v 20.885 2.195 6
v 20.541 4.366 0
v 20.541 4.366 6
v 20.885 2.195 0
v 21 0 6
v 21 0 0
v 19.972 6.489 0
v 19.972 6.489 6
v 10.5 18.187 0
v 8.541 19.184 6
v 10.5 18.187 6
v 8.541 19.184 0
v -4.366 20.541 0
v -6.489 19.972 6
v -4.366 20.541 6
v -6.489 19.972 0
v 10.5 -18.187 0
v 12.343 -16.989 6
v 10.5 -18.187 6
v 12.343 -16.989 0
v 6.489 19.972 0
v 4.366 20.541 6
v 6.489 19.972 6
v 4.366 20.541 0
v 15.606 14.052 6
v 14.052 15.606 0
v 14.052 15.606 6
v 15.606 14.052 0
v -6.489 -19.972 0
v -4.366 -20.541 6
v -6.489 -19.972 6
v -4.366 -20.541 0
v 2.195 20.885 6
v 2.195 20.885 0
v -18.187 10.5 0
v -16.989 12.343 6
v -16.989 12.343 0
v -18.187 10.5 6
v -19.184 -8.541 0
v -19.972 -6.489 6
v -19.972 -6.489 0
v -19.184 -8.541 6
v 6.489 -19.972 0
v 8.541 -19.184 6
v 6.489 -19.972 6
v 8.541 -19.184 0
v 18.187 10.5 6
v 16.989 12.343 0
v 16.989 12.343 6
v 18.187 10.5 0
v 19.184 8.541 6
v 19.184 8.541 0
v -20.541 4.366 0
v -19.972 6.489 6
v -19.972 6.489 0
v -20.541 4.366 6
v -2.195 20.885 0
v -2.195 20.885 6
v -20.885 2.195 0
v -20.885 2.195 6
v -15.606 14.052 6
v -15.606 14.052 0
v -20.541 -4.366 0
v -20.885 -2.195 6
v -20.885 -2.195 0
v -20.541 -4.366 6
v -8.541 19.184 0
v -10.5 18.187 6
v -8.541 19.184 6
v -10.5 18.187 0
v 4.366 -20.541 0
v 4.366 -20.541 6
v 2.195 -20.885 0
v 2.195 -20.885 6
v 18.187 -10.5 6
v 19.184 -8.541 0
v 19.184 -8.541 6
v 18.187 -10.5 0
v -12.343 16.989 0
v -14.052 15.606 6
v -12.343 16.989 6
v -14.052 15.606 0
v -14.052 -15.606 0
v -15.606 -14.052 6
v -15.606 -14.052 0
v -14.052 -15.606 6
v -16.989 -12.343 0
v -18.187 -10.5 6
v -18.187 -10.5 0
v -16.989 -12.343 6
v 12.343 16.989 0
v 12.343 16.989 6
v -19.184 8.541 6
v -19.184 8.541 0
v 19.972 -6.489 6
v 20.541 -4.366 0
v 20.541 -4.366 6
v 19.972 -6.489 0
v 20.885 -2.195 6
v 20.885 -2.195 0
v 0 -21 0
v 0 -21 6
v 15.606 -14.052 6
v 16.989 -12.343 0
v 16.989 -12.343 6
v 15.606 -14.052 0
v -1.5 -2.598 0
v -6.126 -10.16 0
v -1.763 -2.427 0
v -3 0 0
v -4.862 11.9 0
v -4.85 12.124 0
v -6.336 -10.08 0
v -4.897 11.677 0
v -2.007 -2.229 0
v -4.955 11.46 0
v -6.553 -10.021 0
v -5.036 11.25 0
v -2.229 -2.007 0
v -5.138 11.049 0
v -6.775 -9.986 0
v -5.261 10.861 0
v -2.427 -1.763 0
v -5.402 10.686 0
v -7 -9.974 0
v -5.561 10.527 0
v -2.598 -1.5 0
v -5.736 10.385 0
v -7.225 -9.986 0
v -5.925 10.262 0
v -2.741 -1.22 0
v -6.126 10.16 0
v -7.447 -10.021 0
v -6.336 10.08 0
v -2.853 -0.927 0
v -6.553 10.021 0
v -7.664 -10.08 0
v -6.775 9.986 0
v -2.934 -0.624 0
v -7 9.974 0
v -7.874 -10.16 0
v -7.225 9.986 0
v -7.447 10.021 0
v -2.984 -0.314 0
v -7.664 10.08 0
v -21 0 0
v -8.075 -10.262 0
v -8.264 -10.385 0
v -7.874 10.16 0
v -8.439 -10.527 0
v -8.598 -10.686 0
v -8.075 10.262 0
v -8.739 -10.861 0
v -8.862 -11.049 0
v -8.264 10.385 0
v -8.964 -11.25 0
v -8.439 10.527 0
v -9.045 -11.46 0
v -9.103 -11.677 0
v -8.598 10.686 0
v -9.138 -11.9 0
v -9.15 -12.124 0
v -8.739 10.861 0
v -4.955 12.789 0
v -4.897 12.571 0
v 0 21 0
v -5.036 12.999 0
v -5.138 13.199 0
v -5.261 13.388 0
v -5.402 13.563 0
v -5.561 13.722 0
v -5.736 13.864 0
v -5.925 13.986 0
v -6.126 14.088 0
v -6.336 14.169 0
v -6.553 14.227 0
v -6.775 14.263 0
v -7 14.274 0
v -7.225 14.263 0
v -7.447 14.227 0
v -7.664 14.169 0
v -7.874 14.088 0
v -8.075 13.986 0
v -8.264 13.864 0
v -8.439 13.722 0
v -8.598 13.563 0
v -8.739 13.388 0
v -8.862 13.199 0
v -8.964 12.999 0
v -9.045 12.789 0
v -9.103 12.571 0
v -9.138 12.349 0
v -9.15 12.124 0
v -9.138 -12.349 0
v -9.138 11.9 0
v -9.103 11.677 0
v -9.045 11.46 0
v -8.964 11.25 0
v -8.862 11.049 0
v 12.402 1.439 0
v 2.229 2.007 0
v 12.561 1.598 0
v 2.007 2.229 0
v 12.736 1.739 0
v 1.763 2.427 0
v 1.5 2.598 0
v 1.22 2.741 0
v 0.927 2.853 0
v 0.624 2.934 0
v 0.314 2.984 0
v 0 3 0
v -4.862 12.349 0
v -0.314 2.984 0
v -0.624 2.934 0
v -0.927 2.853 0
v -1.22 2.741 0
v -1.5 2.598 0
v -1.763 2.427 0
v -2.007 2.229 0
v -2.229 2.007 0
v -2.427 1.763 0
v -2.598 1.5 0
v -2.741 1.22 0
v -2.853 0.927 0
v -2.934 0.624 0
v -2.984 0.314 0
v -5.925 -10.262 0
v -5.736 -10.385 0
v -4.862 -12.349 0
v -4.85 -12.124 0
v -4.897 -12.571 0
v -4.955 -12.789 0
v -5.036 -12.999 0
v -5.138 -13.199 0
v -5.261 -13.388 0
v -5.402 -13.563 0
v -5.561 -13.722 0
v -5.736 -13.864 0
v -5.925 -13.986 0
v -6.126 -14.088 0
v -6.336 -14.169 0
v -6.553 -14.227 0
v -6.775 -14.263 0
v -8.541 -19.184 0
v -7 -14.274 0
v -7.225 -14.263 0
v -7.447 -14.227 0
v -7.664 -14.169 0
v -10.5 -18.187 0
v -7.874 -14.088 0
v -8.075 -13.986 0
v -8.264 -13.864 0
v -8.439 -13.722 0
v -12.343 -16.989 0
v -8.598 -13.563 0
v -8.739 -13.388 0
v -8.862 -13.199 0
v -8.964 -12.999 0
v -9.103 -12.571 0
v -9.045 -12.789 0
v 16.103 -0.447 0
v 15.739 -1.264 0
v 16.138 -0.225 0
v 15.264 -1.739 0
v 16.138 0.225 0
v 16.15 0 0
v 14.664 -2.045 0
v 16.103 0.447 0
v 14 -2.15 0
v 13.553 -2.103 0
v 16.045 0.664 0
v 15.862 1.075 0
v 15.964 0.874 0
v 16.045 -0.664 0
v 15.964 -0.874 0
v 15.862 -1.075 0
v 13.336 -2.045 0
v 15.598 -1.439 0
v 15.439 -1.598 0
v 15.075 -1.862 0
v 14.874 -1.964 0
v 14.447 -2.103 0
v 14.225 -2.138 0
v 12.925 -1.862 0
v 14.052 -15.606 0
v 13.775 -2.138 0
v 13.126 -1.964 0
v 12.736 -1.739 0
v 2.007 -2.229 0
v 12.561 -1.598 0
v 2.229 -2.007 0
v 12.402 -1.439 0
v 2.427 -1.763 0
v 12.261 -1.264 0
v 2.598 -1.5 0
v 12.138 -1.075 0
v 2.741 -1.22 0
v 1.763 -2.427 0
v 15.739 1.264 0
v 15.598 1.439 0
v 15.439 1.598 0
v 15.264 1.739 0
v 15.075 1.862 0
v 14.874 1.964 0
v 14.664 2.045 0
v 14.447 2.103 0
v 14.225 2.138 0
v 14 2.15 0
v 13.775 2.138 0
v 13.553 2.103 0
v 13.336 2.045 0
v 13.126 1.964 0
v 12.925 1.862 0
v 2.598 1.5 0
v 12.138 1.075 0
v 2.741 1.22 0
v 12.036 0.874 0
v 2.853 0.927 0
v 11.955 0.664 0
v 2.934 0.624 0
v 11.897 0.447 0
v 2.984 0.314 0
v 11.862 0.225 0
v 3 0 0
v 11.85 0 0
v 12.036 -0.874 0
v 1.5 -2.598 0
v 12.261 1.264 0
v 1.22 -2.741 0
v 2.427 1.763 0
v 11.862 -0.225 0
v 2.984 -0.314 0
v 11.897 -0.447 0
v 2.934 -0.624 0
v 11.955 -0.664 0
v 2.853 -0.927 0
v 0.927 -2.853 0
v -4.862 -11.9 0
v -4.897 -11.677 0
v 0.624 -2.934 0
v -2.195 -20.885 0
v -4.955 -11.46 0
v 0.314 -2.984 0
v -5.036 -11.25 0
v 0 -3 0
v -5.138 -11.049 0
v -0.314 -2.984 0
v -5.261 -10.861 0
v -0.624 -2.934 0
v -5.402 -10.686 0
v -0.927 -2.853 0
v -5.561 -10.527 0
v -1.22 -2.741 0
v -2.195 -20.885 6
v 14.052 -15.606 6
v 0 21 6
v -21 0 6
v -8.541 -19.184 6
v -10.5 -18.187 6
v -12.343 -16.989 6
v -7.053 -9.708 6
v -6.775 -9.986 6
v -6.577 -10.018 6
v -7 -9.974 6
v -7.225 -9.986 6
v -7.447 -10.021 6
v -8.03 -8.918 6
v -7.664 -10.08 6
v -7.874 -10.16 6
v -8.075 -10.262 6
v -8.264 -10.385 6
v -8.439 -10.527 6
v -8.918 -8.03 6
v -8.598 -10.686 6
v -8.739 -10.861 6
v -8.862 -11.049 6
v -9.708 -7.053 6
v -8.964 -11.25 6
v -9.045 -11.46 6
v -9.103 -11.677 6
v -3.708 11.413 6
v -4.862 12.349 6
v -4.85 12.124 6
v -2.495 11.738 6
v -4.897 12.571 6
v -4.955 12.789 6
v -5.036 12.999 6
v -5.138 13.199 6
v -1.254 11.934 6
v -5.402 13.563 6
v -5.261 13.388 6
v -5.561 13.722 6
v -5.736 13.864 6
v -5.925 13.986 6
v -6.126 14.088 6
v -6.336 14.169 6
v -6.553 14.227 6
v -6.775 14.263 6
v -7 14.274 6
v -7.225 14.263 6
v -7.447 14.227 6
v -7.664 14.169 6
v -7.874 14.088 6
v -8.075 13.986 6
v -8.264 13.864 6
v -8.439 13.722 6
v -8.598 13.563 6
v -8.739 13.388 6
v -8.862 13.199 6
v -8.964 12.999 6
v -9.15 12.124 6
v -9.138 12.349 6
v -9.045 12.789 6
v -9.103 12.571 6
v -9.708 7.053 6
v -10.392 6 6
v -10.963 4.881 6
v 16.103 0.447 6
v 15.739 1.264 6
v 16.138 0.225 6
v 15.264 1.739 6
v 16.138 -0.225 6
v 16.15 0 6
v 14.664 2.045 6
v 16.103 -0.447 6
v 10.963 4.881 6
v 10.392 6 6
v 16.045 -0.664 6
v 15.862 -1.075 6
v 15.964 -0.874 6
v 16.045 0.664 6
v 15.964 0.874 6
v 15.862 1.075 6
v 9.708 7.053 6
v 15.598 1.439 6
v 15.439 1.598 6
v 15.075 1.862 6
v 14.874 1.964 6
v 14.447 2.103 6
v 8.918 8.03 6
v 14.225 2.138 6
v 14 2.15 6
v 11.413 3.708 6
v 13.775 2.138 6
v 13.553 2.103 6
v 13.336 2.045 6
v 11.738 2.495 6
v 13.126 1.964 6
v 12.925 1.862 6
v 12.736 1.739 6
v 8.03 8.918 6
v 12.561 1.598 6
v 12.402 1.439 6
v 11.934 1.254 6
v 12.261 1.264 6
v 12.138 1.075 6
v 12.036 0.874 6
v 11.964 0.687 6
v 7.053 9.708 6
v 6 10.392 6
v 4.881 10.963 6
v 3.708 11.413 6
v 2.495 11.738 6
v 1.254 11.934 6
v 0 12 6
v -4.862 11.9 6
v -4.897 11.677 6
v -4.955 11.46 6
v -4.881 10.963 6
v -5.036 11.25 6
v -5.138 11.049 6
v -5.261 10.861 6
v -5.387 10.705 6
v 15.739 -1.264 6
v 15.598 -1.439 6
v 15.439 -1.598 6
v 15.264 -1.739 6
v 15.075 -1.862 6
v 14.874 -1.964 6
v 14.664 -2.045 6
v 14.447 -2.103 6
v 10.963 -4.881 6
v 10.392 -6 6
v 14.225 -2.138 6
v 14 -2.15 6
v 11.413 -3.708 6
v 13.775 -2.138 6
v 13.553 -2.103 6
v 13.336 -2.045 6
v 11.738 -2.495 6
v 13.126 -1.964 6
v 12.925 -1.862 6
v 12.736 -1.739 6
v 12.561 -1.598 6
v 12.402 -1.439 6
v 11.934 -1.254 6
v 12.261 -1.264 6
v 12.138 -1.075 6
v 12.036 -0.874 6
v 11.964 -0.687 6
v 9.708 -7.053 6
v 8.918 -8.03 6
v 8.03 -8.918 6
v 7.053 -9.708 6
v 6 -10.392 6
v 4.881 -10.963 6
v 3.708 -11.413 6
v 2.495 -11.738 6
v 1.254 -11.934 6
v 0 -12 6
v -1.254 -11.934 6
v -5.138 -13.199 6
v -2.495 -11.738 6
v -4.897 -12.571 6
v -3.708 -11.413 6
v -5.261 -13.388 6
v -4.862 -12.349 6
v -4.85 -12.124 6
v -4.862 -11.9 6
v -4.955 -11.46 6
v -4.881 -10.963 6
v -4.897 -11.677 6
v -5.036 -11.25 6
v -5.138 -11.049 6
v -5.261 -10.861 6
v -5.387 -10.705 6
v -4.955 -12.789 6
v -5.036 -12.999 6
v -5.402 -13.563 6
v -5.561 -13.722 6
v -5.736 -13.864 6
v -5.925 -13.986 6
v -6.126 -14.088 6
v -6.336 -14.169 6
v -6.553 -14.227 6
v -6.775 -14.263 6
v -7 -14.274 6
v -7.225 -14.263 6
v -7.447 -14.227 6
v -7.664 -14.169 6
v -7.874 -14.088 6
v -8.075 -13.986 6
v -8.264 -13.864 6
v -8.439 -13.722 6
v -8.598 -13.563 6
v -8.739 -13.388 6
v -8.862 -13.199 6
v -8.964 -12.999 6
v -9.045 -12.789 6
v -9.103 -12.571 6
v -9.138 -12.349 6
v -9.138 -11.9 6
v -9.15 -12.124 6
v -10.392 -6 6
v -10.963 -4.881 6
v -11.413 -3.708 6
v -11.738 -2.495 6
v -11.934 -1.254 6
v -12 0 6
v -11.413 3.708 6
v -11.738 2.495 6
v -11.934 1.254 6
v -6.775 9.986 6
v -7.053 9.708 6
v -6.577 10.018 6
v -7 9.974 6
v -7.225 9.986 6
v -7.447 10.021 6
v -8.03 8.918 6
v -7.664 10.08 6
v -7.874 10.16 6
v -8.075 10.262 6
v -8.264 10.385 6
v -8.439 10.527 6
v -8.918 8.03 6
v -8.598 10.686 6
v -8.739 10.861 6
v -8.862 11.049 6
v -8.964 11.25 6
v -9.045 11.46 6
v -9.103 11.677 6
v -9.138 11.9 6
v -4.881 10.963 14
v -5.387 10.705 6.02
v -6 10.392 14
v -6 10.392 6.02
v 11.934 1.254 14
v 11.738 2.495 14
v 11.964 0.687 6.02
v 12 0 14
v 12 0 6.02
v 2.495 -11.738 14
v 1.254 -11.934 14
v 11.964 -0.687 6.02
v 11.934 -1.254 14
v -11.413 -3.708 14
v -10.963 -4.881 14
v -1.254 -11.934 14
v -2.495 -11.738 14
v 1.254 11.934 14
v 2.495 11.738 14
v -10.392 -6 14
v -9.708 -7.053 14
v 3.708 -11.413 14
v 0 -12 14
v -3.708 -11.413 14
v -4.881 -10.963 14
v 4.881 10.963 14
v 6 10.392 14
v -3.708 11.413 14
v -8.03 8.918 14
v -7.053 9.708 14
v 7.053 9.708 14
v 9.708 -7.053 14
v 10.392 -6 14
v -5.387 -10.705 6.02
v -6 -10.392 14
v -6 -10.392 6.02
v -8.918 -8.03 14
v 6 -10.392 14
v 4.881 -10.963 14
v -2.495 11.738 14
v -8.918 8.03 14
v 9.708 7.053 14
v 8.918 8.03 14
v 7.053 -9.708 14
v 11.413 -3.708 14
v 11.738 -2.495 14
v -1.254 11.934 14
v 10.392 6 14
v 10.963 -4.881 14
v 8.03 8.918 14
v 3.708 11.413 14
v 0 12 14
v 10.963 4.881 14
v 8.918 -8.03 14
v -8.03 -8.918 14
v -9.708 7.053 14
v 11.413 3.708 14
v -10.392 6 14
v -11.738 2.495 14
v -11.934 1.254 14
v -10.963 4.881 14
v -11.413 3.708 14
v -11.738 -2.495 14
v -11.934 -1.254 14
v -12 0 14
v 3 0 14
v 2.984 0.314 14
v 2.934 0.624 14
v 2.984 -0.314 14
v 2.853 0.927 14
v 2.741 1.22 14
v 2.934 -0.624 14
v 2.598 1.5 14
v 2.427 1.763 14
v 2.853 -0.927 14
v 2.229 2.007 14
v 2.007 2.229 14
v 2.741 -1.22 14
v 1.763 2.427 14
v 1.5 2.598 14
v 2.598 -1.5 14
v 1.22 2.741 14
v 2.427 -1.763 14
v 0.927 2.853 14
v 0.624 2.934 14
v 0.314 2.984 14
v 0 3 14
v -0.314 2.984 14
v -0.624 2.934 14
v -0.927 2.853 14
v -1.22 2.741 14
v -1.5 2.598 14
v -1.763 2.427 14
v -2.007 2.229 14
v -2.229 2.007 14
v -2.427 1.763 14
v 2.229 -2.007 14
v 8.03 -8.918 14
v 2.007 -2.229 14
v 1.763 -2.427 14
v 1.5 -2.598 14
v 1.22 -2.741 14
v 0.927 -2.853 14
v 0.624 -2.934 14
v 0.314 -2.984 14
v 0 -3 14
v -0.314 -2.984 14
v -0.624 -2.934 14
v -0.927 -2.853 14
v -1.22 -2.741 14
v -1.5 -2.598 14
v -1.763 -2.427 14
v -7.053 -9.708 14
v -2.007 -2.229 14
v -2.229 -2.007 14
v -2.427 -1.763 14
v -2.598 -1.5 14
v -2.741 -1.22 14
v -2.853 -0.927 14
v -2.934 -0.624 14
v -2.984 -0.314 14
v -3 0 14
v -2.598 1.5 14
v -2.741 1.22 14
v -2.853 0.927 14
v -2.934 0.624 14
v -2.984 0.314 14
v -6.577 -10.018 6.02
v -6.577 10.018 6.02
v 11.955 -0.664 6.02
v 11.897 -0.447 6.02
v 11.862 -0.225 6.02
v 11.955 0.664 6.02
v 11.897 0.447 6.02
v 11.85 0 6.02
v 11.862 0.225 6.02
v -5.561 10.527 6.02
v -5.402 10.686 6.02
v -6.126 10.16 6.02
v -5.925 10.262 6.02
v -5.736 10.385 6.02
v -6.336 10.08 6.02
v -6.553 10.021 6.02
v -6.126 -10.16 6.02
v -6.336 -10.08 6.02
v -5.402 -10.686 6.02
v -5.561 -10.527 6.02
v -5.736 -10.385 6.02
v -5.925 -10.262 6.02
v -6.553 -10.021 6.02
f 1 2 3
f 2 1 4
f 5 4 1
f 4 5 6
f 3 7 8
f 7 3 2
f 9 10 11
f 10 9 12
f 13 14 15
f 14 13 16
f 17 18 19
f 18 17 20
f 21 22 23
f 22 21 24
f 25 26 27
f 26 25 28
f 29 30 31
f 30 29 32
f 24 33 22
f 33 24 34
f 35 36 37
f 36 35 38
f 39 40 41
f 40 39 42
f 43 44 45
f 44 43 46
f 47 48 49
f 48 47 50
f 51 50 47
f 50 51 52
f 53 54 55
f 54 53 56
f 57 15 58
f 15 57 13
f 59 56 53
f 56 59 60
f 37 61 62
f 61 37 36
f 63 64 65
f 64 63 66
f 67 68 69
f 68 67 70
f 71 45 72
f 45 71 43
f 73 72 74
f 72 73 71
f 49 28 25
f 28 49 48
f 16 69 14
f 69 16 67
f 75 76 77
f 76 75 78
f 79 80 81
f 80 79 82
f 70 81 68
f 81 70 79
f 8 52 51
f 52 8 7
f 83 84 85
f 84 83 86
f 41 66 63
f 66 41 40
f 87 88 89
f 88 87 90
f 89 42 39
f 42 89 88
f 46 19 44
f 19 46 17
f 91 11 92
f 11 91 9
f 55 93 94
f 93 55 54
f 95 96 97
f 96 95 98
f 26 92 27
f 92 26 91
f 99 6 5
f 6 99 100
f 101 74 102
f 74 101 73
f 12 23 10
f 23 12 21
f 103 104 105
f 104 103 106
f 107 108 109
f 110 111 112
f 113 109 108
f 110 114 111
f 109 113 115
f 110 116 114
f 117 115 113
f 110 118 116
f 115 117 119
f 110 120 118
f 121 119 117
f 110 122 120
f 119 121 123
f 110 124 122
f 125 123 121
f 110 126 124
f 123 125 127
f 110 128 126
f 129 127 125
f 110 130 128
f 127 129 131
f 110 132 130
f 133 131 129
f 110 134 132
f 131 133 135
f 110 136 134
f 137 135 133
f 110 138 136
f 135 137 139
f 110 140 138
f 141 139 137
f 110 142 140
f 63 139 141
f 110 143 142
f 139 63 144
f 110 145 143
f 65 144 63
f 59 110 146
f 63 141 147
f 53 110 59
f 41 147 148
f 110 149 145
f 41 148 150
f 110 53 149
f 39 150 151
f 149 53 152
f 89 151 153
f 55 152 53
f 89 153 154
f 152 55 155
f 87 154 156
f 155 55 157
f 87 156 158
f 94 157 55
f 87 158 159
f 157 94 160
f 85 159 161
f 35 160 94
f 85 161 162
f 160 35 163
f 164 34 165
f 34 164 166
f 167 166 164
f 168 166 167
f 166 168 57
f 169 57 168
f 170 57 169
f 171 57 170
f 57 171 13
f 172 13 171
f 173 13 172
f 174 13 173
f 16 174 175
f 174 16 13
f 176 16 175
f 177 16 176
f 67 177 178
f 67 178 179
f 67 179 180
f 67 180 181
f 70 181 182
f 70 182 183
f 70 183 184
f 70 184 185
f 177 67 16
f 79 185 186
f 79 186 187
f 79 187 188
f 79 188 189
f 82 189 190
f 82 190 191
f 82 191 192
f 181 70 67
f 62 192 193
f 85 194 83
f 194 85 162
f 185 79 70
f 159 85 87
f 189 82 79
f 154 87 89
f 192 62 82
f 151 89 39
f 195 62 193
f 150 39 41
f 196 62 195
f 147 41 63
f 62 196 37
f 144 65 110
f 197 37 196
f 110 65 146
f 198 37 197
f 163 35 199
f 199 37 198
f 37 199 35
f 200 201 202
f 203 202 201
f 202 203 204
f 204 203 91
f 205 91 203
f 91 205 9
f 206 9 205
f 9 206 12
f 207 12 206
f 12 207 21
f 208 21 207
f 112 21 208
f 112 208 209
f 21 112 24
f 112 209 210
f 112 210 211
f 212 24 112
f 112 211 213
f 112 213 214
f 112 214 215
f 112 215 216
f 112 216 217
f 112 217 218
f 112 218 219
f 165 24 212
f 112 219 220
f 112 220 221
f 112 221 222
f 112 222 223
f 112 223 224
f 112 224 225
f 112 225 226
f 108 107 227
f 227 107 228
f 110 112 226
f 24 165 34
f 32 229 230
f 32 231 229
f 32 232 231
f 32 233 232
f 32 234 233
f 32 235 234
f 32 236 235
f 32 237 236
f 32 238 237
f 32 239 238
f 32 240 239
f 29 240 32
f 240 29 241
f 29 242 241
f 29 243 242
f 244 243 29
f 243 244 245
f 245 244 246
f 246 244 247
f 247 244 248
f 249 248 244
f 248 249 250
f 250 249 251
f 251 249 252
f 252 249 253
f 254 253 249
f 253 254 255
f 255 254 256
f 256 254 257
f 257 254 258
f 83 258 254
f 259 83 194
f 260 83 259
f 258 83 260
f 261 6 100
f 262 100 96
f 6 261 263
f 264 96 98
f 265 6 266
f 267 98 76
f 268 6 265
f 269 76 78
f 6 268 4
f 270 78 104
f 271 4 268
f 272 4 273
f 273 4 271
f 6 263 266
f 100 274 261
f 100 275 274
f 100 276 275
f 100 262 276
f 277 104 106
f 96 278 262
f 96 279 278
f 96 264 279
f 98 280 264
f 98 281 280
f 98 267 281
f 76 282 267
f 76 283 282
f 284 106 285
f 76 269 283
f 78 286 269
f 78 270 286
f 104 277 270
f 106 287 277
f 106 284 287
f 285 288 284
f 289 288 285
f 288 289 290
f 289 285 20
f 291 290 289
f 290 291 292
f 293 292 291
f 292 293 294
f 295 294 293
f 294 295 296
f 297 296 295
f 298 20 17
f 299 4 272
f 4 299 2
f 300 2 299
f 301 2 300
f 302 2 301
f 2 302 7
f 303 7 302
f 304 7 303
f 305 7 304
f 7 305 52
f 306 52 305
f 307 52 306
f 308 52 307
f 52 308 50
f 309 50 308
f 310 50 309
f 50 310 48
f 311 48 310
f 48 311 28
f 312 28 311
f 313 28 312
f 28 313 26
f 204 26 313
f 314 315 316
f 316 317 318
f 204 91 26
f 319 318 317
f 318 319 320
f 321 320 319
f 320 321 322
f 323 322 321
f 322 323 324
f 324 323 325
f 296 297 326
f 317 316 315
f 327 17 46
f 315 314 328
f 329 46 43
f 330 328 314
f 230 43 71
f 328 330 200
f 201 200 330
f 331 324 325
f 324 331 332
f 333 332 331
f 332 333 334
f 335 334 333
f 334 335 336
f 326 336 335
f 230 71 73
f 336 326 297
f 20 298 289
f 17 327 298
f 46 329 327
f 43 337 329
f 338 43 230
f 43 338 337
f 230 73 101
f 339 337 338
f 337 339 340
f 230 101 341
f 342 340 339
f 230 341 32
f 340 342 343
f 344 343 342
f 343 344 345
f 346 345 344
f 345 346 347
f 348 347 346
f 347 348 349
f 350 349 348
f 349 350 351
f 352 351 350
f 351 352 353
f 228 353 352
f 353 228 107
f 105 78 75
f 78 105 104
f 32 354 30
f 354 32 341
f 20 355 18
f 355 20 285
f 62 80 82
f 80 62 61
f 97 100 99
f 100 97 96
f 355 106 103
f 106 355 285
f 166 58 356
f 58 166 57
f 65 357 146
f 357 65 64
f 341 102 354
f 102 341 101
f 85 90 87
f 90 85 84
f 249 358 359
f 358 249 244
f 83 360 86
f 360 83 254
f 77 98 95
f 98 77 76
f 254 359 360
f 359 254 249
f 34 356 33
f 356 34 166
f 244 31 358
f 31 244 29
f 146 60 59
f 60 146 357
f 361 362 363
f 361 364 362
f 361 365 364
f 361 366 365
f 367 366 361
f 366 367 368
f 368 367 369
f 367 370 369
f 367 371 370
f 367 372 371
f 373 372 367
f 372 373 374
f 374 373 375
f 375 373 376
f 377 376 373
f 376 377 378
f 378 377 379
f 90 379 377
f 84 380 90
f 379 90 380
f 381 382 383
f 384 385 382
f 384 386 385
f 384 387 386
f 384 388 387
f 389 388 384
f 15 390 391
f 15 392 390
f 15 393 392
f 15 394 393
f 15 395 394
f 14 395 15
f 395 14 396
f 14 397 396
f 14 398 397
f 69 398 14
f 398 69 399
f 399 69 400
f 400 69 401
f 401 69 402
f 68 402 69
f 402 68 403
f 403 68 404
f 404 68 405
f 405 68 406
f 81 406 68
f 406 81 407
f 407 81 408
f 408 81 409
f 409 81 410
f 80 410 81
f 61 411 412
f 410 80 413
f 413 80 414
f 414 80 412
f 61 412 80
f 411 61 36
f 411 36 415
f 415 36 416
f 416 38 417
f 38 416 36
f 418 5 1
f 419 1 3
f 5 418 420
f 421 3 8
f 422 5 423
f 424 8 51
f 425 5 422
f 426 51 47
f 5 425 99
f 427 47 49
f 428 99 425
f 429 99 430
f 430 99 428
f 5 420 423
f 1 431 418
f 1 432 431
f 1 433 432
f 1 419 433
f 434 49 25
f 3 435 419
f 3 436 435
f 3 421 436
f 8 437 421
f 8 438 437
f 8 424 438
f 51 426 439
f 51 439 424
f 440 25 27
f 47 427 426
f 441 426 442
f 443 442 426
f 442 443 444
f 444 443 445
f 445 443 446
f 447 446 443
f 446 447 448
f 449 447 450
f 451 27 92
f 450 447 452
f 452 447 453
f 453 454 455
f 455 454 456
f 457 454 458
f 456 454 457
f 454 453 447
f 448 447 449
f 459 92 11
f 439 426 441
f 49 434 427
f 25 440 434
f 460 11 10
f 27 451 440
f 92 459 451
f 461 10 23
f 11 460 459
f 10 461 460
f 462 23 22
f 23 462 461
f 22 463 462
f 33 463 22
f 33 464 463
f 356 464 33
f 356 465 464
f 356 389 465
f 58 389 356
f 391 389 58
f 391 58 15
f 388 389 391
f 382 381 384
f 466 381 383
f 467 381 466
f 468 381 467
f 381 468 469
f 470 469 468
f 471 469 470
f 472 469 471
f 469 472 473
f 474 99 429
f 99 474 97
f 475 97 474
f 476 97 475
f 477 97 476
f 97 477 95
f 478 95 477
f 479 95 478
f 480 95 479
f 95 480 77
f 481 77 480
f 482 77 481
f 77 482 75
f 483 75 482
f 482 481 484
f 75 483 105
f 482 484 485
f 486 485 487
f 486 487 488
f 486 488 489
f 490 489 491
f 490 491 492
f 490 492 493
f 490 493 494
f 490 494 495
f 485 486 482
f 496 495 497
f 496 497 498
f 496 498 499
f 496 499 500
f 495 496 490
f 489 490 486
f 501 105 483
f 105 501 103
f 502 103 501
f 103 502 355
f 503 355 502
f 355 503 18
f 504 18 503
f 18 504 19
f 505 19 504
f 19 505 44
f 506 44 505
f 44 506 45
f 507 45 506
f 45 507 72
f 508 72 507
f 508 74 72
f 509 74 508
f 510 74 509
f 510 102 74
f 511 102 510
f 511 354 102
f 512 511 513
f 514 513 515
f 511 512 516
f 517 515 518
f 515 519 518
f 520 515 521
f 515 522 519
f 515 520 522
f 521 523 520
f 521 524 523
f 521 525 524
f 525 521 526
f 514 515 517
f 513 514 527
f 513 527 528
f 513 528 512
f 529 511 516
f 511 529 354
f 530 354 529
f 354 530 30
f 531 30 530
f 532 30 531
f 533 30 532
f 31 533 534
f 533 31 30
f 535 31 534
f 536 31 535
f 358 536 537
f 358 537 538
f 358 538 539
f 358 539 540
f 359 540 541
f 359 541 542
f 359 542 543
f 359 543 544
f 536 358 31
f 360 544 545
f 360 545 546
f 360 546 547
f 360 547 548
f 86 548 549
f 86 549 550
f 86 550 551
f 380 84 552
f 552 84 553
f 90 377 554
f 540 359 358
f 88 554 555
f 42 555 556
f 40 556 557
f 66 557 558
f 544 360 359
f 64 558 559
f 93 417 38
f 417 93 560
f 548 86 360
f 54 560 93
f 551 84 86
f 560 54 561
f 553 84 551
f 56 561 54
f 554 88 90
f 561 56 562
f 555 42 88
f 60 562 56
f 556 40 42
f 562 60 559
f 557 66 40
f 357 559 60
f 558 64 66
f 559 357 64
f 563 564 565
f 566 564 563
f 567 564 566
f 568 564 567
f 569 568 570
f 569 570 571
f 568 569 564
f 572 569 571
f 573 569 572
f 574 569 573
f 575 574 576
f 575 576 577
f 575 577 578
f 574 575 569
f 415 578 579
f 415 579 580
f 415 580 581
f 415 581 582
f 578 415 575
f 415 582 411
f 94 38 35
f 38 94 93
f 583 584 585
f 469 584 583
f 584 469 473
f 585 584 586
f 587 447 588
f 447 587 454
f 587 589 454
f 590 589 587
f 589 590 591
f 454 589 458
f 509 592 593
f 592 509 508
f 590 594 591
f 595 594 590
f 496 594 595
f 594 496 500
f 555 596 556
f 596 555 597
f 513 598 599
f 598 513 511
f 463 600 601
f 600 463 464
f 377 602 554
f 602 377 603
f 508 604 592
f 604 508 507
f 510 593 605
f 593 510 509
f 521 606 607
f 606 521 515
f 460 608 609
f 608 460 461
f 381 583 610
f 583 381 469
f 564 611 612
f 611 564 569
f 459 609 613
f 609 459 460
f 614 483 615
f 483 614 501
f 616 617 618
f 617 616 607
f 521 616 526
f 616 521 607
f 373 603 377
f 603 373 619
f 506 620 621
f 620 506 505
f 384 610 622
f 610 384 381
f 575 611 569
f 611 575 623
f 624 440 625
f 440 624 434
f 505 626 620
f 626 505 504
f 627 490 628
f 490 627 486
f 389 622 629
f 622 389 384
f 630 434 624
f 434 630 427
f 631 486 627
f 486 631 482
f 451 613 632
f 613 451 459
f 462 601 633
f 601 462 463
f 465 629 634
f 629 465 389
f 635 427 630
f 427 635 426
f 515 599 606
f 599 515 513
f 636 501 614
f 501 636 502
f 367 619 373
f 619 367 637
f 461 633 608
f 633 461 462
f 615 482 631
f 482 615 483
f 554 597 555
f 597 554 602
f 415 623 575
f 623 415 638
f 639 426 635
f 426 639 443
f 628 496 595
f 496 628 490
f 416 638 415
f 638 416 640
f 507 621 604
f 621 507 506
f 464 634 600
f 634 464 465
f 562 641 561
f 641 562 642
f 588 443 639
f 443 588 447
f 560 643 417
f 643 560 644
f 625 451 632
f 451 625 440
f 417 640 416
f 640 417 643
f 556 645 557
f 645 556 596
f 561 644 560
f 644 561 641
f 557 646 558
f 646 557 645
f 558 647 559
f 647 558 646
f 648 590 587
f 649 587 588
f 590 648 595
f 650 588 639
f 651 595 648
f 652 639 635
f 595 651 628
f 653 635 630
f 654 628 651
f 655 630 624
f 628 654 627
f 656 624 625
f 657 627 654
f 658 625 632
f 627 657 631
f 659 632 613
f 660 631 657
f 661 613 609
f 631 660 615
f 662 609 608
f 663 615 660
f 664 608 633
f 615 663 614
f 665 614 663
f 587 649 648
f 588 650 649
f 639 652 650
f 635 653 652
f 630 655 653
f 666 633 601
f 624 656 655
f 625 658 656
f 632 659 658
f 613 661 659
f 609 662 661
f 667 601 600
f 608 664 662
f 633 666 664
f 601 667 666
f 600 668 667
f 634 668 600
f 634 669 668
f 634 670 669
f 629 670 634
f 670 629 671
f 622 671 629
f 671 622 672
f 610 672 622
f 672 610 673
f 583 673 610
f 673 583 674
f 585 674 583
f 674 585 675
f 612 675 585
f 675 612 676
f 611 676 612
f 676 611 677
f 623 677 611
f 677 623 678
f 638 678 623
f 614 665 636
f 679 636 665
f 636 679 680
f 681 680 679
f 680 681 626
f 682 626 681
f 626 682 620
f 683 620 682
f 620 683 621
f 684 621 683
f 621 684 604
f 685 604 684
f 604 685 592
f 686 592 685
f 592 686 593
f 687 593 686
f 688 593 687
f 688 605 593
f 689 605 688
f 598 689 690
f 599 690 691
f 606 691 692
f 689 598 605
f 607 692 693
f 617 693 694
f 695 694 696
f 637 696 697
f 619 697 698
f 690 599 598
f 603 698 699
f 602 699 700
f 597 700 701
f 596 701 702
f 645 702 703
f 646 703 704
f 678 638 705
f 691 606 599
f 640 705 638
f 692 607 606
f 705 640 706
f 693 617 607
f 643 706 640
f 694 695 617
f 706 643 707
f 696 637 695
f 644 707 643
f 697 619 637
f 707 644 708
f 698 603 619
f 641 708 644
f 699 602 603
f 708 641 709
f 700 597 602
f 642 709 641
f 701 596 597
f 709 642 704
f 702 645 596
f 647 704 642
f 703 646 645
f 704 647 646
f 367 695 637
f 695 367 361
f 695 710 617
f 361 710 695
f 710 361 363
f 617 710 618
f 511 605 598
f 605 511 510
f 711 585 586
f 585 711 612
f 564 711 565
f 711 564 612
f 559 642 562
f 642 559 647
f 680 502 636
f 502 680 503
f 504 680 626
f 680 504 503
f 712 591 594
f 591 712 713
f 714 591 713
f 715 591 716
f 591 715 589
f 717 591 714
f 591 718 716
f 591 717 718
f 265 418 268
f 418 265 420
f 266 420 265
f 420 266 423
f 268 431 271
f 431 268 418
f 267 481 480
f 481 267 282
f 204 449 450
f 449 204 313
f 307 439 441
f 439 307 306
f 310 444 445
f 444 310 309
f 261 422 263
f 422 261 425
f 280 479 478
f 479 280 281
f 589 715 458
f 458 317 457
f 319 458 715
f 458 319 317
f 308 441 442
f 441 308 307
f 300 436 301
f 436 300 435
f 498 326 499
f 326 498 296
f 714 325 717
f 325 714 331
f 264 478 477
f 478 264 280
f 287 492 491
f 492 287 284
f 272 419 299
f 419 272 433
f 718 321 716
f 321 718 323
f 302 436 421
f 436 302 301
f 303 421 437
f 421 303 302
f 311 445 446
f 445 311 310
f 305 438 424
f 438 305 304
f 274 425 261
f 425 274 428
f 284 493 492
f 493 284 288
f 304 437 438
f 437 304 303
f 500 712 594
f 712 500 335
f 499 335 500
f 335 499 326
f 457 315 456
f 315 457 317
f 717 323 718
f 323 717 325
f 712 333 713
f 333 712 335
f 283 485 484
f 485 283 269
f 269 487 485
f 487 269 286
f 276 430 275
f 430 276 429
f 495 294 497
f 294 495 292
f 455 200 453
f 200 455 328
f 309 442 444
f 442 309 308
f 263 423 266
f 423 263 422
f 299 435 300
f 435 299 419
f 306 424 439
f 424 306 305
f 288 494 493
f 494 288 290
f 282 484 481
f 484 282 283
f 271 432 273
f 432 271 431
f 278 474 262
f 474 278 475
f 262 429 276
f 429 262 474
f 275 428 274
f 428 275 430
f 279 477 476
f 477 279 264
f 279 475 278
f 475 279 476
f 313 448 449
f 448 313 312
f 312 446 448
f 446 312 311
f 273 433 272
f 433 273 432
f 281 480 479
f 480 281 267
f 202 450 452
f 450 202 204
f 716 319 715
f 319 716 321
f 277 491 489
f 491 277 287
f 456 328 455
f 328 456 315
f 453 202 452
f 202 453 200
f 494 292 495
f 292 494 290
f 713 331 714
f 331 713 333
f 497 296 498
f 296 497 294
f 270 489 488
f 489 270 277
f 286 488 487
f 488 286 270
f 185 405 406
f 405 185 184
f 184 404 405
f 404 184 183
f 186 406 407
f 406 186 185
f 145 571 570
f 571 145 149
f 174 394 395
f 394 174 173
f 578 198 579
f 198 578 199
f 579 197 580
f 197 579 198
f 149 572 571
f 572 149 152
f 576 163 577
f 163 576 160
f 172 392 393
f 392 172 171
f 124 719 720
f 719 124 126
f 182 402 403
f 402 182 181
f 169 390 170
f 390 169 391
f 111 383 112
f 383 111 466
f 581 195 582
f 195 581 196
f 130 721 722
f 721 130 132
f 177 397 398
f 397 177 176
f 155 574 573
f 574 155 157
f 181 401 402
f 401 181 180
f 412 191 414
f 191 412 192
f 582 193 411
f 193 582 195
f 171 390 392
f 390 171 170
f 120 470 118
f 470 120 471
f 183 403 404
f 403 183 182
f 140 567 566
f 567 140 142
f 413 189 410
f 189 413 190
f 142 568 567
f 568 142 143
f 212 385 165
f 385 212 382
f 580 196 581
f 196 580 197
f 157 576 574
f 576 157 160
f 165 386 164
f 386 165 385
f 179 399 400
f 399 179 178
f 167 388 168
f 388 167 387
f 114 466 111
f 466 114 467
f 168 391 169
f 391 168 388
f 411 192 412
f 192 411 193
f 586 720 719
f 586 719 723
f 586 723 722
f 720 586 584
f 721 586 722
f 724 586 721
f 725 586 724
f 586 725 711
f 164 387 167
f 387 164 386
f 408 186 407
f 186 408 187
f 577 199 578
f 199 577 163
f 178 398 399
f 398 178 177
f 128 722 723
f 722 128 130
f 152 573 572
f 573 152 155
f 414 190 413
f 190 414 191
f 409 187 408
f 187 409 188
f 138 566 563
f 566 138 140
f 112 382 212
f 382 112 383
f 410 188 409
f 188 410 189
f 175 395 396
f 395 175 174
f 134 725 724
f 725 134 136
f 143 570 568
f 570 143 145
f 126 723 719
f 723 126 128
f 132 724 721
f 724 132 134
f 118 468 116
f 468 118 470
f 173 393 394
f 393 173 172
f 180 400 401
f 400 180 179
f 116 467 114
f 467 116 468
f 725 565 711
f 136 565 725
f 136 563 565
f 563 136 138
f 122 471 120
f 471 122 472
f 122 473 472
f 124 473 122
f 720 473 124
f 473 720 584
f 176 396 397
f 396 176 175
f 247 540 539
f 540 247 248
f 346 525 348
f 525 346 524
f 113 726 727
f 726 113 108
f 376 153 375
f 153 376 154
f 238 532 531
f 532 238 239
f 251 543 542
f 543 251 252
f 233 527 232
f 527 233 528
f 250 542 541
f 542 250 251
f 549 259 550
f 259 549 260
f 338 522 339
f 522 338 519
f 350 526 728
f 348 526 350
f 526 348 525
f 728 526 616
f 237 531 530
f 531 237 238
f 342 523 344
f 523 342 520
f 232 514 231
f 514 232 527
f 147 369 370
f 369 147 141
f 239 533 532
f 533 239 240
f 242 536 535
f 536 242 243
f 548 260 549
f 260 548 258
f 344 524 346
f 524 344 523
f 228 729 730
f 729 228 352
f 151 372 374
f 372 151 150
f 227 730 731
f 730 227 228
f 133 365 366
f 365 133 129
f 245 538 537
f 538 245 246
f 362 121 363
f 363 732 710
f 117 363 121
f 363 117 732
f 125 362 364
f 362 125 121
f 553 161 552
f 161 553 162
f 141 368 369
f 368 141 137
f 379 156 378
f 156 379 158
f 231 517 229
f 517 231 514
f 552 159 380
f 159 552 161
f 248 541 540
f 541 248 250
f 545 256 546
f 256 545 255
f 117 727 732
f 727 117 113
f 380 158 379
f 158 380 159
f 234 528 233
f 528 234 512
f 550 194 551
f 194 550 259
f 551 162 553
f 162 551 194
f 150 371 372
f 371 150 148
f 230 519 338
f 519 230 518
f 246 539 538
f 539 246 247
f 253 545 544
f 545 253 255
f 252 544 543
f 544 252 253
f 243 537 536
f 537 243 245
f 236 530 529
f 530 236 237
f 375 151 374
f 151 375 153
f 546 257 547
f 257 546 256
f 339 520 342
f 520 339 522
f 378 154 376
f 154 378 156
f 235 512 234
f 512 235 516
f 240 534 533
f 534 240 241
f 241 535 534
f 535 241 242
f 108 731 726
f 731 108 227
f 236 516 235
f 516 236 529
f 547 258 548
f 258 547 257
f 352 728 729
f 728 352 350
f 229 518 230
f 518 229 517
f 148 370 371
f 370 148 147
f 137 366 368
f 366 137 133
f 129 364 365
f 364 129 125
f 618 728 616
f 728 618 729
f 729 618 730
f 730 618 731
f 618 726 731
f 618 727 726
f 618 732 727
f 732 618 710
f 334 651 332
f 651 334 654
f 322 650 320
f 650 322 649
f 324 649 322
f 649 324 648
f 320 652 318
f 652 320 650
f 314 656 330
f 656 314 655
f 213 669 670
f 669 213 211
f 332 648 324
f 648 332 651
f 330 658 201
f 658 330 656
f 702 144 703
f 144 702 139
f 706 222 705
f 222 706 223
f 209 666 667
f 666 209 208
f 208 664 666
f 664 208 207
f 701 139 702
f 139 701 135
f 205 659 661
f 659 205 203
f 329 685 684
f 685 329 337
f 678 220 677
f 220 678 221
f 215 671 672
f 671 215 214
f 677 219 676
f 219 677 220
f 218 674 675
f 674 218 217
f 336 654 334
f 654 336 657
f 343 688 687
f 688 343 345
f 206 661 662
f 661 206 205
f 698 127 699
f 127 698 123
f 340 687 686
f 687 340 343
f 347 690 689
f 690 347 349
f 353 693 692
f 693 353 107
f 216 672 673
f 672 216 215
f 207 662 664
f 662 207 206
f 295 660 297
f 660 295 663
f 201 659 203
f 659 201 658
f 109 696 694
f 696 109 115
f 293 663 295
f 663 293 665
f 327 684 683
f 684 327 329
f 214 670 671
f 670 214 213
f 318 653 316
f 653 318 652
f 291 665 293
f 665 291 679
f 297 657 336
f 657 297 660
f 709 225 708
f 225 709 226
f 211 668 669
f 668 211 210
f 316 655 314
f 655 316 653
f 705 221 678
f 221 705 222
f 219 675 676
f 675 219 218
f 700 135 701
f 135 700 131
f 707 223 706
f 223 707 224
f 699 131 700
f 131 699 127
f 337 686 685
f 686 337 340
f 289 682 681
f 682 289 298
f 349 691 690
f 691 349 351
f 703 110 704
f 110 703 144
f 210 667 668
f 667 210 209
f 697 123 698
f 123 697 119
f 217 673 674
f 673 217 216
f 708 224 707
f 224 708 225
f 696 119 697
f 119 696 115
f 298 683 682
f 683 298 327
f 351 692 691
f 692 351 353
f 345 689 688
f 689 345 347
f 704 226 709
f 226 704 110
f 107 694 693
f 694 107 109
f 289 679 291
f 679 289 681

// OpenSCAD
// 3-bolt mounting flange, 42 mm OD.
$fn = 60;
eps = 0.02;
flange_d = 42;
flange_t = 6;
hub_d = 24;
hub_h = 14;
center_d = 6;
bolt_circle_d = 28;
bolt_d = 4.3;
difference() {
    union() { cylinder(d = flange_d, h = flange_t); cylinder(d = hub_d, h = hub_h); }
    translate([0, 0, -eps]) cylinder(d = center_d, h = hub_h + 2 * eps);
    for (i = [0 : 2]) rotate([0, 0, i * 360 / 3])
        translate([bolt_circle_d / 2, 0, -eps]) cylinder(d = bolt_d, h = flange_t + 2 * eps);
}
